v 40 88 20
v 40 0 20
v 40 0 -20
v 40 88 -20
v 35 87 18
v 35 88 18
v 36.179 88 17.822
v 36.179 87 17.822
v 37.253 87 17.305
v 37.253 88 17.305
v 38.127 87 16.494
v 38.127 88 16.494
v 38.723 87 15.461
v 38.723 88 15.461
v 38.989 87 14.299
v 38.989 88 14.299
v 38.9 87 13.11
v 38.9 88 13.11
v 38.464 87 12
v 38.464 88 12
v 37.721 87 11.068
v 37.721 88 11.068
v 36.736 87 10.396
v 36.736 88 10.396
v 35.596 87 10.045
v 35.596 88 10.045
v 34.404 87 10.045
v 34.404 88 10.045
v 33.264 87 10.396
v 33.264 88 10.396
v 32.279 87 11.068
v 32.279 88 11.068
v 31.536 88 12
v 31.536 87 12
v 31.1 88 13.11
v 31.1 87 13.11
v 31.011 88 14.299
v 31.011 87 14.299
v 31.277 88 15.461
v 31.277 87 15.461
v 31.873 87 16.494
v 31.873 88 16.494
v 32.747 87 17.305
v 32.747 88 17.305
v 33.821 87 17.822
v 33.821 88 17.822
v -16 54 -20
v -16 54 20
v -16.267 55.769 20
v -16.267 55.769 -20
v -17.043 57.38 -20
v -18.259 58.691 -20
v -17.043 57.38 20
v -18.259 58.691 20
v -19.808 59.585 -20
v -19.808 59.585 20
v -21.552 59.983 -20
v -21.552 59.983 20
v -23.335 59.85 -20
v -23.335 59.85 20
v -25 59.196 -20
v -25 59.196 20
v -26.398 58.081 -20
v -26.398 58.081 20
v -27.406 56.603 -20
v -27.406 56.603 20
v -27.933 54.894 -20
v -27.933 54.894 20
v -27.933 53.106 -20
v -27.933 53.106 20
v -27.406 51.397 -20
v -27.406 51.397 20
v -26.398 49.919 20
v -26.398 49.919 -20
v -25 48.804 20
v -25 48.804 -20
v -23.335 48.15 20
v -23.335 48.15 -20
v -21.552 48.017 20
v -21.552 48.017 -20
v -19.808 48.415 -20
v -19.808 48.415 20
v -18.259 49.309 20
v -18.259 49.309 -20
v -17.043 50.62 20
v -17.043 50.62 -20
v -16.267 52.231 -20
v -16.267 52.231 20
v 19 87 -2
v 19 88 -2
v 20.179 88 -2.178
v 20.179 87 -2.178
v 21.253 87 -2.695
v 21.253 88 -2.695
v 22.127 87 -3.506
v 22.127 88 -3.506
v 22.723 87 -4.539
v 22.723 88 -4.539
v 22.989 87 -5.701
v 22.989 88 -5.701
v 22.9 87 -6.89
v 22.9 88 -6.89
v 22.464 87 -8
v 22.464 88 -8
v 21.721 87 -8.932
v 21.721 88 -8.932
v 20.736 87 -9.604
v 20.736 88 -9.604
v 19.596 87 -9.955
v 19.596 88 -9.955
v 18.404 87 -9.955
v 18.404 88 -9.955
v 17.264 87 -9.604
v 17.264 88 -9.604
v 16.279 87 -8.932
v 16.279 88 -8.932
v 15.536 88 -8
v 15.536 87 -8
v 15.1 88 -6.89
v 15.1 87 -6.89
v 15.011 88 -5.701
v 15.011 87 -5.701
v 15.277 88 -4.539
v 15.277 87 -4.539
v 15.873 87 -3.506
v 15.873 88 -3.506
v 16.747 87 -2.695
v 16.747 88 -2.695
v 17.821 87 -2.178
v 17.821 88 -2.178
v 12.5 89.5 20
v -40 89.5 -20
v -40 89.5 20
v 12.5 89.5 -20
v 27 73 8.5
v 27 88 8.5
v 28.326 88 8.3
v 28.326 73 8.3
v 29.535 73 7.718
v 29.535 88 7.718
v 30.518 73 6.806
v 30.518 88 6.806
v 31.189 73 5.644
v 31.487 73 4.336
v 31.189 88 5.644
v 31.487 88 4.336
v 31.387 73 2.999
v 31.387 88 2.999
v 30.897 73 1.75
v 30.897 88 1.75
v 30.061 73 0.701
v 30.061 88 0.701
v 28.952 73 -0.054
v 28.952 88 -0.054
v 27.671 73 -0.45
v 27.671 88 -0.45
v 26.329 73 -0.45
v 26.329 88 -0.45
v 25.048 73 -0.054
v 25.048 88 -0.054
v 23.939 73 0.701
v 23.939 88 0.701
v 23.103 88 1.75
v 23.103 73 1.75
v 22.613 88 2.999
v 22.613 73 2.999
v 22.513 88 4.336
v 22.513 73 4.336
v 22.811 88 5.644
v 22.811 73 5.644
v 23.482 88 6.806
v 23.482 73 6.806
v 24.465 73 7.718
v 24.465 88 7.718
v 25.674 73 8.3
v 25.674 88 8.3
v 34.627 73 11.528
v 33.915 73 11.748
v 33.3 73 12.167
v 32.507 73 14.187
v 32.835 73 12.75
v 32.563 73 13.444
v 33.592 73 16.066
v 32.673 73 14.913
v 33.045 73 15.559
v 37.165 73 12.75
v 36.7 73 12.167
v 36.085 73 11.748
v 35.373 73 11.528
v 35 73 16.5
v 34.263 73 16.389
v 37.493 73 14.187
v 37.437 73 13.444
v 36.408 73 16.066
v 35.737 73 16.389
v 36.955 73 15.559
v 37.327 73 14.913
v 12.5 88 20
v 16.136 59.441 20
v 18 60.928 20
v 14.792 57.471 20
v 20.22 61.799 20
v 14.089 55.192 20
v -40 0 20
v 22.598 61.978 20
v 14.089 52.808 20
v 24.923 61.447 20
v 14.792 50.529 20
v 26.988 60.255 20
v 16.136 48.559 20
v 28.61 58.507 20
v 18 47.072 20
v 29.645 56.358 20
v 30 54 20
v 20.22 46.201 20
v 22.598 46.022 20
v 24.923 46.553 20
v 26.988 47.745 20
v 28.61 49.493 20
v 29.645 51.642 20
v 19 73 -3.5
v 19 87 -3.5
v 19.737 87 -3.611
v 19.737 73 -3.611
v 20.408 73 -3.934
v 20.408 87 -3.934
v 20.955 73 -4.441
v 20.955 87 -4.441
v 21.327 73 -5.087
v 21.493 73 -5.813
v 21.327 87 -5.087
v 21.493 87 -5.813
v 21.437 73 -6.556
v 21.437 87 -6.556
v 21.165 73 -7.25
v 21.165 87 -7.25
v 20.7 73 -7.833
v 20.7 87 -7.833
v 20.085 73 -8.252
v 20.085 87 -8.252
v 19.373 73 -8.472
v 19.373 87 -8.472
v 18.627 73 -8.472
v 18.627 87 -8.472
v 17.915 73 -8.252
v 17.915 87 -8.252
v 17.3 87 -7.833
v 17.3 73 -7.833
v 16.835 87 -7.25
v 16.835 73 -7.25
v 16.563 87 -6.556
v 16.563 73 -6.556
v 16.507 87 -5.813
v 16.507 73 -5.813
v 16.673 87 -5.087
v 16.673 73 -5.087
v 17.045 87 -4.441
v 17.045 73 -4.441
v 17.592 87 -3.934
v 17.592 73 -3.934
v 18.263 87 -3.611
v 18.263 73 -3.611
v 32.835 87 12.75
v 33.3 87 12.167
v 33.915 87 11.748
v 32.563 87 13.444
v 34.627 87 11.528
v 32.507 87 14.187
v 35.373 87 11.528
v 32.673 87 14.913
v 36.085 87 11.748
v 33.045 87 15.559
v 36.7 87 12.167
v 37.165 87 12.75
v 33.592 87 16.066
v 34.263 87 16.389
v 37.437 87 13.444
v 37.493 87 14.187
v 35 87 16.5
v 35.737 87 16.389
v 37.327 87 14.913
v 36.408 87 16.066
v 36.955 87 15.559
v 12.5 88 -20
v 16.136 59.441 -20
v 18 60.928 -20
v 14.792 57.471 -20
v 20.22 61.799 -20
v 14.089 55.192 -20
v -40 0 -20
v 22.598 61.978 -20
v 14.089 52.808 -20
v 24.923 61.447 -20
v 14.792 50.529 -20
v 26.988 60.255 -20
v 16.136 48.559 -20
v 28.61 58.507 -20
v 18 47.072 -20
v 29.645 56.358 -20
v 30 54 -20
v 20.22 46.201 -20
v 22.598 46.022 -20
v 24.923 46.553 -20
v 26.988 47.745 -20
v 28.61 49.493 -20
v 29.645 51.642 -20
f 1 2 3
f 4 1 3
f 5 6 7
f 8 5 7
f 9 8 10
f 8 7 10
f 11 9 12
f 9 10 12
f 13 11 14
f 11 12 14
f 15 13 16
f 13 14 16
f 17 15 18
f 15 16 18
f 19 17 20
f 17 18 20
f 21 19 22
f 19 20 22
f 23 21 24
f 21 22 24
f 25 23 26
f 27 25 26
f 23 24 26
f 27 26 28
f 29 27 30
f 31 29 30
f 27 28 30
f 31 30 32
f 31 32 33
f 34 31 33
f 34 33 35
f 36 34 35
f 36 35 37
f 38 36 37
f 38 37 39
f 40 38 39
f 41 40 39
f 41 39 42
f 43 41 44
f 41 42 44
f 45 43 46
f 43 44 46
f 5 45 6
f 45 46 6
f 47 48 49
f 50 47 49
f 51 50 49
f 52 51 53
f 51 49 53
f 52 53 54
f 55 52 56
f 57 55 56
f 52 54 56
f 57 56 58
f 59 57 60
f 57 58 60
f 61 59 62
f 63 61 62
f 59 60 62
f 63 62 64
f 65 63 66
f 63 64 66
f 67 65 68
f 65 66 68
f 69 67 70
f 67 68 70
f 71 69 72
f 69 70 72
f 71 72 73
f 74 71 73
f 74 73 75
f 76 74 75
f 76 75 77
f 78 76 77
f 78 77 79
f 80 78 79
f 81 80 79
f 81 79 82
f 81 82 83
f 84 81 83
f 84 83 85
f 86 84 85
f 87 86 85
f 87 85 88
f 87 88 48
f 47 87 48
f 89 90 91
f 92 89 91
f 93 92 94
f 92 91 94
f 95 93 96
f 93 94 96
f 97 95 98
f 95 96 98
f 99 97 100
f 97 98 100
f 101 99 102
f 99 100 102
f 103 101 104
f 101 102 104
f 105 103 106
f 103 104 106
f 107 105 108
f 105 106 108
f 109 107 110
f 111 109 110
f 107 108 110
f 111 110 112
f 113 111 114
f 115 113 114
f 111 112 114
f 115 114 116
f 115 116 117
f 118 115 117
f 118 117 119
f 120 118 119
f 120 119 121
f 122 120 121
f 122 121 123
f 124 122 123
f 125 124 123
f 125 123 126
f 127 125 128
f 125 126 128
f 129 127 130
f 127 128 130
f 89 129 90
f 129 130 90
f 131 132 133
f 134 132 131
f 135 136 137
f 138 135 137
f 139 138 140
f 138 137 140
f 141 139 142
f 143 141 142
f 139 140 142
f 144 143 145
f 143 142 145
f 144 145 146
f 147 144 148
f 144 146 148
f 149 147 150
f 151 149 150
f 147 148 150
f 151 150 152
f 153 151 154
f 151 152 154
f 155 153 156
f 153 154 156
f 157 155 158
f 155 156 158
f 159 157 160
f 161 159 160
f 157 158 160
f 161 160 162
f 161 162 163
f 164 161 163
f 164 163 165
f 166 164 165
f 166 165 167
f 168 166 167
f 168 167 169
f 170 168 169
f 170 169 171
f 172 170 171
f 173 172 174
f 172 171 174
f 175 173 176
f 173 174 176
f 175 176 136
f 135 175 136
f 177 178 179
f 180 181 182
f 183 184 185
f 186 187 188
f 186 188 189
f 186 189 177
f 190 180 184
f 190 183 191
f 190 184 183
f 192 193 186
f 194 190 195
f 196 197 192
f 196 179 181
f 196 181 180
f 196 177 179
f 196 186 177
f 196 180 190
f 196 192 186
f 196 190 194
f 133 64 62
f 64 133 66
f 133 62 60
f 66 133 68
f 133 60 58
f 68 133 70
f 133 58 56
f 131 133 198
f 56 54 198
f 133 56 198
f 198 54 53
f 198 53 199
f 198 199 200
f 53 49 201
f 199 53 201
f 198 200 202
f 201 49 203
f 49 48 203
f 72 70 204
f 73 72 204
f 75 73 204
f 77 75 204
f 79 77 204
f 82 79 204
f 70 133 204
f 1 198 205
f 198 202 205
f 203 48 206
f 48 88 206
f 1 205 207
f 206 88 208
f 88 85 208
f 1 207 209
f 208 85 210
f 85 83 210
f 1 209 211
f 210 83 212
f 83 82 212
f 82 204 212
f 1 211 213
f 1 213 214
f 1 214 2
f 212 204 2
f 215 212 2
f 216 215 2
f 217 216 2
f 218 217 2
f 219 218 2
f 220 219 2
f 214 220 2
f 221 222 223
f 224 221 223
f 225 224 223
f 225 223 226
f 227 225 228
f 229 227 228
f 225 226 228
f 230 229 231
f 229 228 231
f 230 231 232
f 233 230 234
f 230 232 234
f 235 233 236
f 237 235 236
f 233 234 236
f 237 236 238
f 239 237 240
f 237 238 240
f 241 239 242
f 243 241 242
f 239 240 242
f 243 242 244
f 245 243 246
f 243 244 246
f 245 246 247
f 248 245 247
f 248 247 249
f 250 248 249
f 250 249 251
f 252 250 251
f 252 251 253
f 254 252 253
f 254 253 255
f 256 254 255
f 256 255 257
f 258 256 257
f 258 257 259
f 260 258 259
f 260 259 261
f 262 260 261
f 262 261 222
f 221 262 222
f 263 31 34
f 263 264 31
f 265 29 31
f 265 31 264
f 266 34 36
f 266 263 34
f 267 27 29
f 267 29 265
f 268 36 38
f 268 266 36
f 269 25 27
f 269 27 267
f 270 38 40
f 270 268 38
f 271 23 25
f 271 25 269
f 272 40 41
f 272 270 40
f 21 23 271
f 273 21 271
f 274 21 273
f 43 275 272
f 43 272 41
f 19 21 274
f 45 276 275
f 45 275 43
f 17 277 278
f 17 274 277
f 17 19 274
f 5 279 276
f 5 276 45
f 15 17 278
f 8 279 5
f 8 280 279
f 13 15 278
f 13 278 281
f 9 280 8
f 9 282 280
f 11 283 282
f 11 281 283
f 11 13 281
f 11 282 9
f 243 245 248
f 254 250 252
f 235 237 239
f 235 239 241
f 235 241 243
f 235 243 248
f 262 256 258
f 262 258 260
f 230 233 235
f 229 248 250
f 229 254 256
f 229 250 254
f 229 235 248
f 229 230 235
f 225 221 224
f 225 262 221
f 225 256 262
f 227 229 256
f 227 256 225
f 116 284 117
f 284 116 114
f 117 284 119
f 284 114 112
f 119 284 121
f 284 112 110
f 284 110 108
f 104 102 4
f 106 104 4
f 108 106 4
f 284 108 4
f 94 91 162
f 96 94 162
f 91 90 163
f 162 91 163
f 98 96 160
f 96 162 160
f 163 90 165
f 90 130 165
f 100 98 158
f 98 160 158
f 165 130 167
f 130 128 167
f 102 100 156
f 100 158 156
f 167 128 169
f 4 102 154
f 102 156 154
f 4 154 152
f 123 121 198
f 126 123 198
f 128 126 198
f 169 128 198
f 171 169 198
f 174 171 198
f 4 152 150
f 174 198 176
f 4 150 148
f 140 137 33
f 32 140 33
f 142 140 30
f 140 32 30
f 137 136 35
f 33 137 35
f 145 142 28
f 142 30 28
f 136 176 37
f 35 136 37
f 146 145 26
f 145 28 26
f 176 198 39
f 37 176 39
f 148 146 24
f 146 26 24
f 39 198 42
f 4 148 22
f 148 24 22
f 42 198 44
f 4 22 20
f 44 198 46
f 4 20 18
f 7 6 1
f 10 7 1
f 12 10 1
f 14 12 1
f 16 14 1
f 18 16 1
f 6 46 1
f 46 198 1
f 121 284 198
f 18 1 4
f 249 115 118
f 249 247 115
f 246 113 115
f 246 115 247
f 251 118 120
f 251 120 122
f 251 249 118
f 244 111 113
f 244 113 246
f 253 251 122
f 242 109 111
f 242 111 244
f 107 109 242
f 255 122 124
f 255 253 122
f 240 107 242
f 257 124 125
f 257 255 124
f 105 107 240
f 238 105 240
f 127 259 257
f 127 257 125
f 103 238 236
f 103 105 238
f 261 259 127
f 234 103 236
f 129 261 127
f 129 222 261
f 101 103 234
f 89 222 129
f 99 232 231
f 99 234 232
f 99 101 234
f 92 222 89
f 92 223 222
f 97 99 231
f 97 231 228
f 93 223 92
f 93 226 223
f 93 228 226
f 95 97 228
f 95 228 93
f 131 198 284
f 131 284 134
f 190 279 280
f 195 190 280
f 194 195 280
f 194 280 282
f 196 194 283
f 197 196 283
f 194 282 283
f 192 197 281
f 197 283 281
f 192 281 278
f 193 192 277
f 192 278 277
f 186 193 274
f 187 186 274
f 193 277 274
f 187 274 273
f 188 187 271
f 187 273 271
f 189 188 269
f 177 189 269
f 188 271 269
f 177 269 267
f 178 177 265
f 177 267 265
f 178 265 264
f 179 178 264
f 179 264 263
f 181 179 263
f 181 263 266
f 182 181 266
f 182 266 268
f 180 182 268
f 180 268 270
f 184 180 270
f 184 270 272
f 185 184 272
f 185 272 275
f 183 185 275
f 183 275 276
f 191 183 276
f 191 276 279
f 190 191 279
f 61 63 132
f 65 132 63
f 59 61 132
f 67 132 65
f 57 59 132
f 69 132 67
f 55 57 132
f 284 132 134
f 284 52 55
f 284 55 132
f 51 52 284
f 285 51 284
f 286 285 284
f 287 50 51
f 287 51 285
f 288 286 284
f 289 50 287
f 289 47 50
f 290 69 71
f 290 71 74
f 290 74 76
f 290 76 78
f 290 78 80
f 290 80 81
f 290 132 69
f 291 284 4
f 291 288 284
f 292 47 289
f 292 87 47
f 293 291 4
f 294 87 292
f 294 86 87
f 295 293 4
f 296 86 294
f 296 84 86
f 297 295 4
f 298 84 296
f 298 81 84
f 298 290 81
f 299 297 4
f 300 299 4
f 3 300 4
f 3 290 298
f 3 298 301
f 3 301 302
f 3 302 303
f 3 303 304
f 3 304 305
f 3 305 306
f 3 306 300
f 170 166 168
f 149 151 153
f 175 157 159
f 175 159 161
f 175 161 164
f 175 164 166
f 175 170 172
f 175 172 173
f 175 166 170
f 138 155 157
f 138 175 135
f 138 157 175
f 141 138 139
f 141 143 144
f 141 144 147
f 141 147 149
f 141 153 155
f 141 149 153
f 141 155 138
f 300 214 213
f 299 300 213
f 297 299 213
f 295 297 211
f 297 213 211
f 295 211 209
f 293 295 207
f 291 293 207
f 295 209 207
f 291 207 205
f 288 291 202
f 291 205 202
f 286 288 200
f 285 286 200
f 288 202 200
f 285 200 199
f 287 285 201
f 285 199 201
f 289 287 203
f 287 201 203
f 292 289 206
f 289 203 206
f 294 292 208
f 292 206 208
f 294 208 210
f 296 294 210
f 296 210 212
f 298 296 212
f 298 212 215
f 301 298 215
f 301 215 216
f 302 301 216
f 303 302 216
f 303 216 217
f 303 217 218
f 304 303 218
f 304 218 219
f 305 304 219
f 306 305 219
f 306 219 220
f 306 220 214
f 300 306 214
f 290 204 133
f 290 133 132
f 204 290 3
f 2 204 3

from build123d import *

# Parameters (mm, degrees)
SKETCH_1_W          = 80
SKETCH_1_H          = 40
EXTRUDE_1_DEPTH     = 89.5
SKETCH_2_W          = 27.5
SKETCH_2_H          = 1.5
CUT_EXTRUDE_1_DEPTH = 46
SKETCH_3_R          = 6
SKETCH_3_R_2        = 8
CUT_EXTRUDE_2_DEPTH = 46
SKETCH_4_R          = 2.5
SKETCH_4_R_2        = 4.5
CUT_EXTRUDE_3_DEPTH = 15
SKETCH_5_R          = 4
CUT_EXTRUDE_4_DEPTH = 1


with BuildPart() as part:
    # 草图1 → 凸台-拉伸1 (new body)
    with BuildSketch(Plane(origin=(0, 0, 0), x_dir=(1, 0, 0), z_dir=(0, 1, 0))):
        Rectangle(SKETCH_1_W, SKETCH_1_H)
    extrude(amount=EXTRUDE_1_DEPTH)

    # 草图2 → 切除-拉伸1 (cut)
    with BuildSketch(Plane.XY.offset(20)):
        with Locations((26.25, 88.75)):
            Rectangle(SKETCH_2_W, SKETCH_2_H)
    extrude(amount=-CUT_EXTRUDE_1_DEPTH, mode=Mode.SUBTRACT)

    # 草图3 → 切除-拉伸2 (cut)
    with BuildSketch(Plane.XY.offset(20)):
        with Locations((-22, 54)):
            Circle(SKETCH_3_R)
        with Locations((22, 54)):
            Circle(SKETCH_3_R_2)
    extrude(amount=-CUT_EXTRUDE_2_DEPTH, mode=Mode.SUBTRACT)

    # 草图4 → 切除-拉伸3 (cut)
    with BuildSketch(Plane(origin=(0, 88, 0), x_dir=(1, 0, 0), z_dir=(0, 1, 0))):
        with Locations(Location((35, -14, 0), (0, 0, 270))):
            Circle(SKETCH_4_R)
        with Locations(Location((19, 6, 0), (0, 0, 270))):
            Circle(SKETCH_4_R)
        with Locations(Location((27, -4, 0), (0, 0, 270))):
            Circle(SKETCH_4_R_2)
    extrude(amount=-CUT_EXTRUDE_3_DEPTH, mode=Mode.SUBTRACT)

    # 草图5 → 切除-拉伸4 (cut)
    with BuildSketch(Plane(origin=(0, 88, 0), x_dir=(1, 0, 0), z_dir=(0, 1, 0))):
        with Locations(Location((19, 6, 0), (0, 0, 270))):
            Circle(SKETCH_5_R)
        with Locations(Location((35, -14, 0), (0, 0, 270))):
            Circle(SKETCH_5_R)
    extrude(amount=-CUT_EXTRUDE_4_DEPTH, mode=Mode.SUBTRACT)


solid = part.part
